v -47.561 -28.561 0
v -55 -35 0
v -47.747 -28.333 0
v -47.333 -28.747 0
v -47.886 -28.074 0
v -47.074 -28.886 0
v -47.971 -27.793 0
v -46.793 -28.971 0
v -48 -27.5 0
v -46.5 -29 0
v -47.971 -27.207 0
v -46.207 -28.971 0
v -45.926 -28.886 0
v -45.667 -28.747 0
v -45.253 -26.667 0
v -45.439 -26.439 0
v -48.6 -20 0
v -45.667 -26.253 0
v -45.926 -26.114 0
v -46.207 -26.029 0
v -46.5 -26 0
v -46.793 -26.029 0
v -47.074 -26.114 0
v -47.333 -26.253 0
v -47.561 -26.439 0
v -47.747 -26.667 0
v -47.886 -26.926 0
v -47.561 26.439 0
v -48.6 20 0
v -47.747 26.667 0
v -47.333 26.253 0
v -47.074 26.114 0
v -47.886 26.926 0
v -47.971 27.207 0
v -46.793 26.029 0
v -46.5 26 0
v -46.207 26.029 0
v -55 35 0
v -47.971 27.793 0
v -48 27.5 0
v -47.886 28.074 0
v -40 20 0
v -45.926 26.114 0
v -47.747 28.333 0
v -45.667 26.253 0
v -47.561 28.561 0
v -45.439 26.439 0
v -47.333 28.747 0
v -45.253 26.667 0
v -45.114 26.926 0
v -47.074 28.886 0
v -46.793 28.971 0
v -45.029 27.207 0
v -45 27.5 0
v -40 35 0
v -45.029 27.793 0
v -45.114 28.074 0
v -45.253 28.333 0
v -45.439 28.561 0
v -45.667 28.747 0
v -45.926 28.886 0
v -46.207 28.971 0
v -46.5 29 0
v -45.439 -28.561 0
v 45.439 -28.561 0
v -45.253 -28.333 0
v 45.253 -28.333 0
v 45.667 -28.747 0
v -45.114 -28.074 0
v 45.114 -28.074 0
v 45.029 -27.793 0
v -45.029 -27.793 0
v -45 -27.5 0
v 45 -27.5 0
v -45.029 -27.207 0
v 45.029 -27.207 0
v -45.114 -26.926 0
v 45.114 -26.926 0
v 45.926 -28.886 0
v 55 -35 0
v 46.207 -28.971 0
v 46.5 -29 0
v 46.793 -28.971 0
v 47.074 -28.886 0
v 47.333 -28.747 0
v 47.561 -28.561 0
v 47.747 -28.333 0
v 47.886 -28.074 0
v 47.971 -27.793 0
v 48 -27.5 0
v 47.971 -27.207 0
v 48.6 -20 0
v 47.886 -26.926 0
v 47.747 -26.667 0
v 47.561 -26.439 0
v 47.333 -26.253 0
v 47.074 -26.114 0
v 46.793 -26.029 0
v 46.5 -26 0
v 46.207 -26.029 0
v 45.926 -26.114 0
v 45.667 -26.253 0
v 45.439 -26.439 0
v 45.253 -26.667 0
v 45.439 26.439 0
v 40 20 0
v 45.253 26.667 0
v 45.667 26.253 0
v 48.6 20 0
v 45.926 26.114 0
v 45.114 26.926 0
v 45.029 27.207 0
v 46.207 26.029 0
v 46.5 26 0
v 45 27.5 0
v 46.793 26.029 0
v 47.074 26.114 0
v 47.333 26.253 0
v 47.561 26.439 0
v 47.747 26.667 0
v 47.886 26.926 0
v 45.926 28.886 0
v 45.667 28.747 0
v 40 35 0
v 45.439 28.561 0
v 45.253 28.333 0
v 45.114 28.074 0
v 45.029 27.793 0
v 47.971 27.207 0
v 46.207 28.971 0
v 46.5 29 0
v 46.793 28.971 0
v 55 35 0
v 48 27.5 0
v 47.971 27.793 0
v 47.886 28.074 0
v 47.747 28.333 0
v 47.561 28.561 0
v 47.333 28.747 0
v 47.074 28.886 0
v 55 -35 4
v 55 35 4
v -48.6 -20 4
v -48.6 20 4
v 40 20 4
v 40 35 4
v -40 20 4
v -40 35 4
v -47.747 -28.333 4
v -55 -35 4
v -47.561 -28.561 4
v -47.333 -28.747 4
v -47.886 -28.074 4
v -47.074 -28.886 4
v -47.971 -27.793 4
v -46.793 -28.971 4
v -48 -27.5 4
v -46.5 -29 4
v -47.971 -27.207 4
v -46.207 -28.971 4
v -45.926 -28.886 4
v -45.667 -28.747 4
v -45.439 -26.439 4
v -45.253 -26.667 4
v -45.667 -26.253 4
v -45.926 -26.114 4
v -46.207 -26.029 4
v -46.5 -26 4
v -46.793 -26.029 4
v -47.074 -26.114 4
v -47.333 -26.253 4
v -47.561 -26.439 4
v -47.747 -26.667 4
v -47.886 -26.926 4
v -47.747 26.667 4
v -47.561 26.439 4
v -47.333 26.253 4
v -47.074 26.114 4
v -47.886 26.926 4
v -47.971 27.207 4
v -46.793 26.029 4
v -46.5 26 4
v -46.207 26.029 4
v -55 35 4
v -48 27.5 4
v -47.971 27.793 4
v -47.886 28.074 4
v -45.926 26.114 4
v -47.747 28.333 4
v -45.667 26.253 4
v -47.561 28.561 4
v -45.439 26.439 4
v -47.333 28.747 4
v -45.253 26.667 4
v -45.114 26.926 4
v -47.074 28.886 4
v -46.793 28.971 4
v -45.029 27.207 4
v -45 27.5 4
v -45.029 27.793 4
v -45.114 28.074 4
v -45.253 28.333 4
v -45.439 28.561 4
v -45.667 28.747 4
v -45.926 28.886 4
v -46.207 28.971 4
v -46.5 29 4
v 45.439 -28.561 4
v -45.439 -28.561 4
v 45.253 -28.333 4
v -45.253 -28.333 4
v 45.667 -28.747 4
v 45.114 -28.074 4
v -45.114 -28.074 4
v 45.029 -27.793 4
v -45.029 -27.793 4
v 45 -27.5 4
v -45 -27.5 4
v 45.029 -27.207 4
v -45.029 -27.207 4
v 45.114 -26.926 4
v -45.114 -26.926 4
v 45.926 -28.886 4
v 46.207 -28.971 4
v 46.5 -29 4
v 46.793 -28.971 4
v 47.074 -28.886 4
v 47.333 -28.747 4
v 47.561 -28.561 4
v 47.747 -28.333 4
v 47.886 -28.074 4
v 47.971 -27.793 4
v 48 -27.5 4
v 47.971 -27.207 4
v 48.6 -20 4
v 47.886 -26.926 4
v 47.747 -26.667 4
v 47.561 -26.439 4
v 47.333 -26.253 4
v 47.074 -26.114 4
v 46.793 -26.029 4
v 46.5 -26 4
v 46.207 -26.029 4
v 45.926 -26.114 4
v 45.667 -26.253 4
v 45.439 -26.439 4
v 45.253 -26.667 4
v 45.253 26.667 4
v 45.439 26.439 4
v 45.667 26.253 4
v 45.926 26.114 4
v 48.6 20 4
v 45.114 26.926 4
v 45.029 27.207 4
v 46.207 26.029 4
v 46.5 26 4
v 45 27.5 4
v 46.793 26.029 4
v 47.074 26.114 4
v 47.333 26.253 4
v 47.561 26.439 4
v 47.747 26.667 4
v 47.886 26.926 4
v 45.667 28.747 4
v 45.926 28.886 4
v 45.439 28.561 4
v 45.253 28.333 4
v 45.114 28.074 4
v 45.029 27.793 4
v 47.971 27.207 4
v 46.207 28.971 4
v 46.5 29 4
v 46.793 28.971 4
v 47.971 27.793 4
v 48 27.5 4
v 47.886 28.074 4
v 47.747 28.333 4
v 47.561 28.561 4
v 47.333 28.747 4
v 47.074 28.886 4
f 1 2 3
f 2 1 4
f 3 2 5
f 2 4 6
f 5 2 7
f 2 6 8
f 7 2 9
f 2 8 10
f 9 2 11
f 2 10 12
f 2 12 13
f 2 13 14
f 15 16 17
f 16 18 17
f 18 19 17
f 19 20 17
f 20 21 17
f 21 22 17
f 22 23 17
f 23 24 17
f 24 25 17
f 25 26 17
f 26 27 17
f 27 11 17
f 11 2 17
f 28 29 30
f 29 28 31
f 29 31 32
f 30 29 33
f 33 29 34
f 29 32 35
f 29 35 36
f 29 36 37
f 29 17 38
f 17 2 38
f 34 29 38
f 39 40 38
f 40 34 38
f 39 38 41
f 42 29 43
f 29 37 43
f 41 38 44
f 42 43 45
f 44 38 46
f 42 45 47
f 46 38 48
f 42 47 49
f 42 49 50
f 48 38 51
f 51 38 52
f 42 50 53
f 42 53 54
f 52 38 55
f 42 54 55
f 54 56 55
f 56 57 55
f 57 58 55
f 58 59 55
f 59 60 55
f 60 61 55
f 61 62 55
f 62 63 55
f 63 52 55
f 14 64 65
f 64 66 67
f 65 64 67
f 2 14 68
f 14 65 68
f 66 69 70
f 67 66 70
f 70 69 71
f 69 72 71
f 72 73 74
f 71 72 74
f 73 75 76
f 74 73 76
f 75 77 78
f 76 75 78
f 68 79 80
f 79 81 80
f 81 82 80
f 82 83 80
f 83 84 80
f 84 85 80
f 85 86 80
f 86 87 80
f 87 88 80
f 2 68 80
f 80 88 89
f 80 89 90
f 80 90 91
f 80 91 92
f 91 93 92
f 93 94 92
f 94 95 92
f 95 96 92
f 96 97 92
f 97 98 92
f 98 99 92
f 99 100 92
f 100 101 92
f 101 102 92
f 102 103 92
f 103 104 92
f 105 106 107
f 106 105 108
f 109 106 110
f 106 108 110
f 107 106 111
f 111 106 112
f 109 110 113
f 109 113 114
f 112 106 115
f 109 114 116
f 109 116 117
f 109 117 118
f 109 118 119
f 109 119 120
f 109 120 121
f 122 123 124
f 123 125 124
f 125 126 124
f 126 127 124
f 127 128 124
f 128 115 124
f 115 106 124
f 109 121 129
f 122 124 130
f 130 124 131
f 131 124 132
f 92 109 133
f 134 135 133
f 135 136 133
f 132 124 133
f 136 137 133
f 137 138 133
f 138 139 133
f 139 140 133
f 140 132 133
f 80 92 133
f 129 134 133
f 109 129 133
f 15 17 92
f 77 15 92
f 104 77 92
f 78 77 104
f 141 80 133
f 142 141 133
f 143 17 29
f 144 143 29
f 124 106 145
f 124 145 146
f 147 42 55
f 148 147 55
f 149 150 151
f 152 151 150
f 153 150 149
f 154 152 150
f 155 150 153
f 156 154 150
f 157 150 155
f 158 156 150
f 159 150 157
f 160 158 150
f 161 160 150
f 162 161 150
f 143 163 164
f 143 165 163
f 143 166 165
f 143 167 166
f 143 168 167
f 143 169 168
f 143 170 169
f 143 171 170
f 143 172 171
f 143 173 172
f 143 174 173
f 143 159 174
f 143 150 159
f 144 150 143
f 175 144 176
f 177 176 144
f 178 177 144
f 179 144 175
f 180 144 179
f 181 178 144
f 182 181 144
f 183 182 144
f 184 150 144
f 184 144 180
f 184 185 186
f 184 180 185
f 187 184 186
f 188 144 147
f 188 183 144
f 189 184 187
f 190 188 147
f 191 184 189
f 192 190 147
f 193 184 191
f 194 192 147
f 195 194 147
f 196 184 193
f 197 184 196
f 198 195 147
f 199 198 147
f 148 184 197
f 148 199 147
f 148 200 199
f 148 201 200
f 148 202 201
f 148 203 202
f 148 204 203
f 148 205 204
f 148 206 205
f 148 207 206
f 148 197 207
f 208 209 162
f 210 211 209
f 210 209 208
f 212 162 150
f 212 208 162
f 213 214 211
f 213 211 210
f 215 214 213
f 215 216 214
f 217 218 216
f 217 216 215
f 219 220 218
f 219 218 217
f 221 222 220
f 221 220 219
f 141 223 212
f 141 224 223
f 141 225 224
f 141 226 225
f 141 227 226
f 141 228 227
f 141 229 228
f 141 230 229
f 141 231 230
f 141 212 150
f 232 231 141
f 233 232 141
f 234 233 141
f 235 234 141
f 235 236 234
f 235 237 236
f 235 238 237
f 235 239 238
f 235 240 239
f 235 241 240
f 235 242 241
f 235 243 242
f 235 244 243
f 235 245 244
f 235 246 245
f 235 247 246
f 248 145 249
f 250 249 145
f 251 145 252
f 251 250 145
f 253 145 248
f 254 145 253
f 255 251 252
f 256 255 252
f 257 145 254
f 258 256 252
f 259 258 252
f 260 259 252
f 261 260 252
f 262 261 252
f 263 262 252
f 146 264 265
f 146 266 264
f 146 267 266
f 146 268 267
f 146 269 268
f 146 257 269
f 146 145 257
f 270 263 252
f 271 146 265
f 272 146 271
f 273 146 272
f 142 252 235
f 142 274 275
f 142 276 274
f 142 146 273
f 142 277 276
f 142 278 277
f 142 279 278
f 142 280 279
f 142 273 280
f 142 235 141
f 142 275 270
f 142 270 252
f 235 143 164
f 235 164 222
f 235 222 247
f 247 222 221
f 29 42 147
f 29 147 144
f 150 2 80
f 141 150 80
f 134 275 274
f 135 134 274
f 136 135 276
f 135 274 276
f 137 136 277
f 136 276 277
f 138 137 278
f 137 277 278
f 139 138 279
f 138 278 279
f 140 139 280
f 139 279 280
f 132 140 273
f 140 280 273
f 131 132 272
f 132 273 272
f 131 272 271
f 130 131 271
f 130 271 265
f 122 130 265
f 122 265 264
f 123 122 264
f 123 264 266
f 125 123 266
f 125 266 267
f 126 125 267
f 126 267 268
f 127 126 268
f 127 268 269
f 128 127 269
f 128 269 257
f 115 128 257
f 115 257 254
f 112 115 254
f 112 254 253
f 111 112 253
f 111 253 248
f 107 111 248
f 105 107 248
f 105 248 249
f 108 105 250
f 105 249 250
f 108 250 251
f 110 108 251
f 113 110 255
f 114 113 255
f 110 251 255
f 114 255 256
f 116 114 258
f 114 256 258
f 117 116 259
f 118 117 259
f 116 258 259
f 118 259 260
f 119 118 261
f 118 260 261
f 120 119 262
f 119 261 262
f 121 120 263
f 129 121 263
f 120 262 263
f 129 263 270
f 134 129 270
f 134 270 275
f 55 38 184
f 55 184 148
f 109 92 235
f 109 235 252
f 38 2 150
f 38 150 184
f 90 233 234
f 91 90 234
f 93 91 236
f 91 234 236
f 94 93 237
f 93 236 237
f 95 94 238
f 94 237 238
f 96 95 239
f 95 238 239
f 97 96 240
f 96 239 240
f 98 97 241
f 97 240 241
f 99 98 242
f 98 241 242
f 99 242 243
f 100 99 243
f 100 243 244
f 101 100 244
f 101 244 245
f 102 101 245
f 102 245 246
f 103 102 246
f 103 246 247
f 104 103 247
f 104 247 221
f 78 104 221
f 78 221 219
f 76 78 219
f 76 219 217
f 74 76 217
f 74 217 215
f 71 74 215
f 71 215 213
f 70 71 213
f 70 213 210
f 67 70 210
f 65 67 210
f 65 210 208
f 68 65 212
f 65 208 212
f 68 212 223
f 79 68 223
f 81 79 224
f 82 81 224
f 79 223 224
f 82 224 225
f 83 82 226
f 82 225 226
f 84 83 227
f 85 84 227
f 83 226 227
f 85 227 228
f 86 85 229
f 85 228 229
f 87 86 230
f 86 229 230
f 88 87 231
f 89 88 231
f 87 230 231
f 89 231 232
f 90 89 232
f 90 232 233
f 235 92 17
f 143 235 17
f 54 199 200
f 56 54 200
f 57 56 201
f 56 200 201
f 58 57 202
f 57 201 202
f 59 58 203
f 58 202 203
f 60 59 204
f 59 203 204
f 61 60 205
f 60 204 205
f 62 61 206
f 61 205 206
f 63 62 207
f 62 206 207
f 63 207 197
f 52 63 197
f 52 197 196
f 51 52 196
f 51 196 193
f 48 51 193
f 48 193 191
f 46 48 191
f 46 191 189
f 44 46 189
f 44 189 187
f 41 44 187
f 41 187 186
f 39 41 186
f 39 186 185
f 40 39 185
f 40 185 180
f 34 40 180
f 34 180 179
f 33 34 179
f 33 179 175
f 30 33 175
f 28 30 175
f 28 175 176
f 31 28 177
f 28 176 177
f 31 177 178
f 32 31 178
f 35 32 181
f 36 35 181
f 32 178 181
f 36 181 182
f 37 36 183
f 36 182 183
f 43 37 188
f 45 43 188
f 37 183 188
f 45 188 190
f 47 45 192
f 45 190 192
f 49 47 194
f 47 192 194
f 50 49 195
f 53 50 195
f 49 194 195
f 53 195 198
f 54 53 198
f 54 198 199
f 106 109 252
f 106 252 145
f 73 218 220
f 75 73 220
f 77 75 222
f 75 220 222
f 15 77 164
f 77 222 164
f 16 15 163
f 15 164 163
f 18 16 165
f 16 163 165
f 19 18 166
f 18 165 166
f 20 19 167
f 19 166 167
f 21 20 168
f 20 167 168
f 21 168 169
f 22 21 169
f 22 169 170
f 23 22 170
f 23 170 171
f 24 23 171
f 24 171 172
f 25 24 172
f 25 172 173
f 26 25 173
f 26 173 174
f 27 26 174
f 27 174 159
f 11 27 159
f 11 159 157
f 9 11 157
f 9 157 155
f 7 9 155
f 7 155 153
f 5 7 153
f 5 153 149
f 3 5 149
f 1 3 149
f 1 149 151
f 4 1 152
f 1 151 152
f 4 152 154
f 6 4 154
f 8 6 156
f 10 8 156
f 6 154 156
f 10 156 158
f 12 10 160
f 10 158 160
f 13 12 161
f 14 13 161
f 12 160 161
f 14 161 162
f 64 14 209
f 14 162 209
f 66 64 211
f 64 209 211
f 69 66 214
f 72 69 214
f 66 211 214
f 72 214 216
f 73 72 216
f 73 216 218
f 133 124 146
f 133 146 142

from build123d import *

# Parameters (mm, degrees)
SKETCH1_W             = 110
SKETCH1_H             = 70
PLATE_DEPTH           = 4
SKETCH2_W             = 97.2
SKETCH2_H             = 40
SCREEN_HOLE_DEPTH     = 66.314623171
F_3_0MM_DOWEL_HOLE1_D = 3
SKETCH6_W             = 80
SKETCH6_H             = 15
CUT_EXTRUDE1_DEPTH    = 66.314623171


with BuildPart() as part:
    # Sketch1 → Plate (new body)
    with BuildSketch(Plane.XY):
        Rectangle(SKETCH1_W, SKETCH1_H)
    extrude(amount=PLATE_DEPTH)

    # Sketch2 → Screen hole (cut, through all)
    with BuildSketch(Plane(origin=(0, 0, 0), x_dir=(-1, 0, 0), z_dir=(0, 0, -1))):
        Rectangle(SKETCH2_W, SKETCH2_H)
    extrude(amount=-SCREEN_HOLE_DEPTH, mode=Mode.SUBTRACT)

    # Ø3.0mm Dowel Hole1 (through all)
    with Locations(Plane(origin=(46.5, 27.5, 0), x_dir=(-1, 0, 0), z_dir=(0, 0, -1))):
        with Locations((0, 0), (93, 0), (93, -55), (0, -55)):
            Hole(F_3_0MM_DOWEL_HOLE1_D / 2)

    # Sketch6 → Cut-Extrude1 (cut, through all)
    with BuildSketch(Plane(origin=(0, 0, 0), x_dir=(-1, 0, 0), z_dir=(0, 0, -1))):
        with Locations((0, 27.5)):
            Rectangle(SKETCH6_W, SKETCH6_H)
    extrude(amount=-CUT_EXTRUDE1_DEPTH, mode=Mode.SUBTRACT)


solid = part.part
